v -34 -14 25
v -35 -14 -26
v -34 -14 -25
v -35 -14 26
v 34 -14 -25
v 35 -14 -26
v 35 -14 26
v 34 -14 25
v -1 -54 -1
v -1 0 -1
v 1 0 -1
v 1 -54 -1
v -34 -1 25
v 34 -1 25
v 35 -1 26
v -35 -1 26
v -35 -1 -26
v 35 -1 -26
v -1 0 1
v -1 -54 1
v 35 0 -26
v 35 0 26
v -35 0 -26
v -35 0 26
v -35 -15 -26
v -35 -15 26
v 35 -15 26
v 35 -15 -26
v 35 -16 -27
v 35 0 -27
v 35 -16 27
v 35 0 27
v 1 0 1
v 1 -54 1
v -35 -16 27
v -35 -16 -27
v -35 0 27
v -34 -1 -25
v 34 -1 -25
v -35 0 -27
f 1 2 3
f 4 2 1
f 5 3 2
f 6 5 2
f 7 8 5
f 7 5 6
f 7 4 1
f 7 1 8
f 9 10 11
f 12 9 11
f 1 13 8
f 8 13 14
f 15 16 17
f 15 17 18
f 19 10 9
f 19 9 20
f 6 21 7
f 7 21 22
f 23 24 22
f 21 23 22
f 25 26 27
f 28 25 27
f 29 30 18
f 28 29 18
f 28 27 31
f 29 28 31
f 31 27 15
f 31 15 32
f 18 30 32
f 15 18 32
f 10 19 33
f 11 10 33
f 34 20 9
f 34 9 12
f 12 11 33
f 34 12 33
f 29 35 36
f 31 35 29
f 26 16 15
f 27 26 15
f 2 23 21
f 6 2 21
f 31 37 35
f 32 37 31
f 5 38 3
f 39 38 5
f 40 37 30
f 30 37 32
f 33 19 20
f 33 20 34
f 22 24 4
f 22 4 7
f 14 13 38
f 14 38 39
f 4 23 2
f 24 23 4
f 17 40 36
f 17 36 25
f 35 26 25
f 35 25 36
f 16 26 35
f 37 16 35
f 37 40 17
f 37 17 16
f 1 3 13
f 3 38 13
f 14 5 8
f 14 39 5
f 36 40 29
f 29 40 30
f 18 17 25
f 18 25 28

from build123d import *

# Parameters (mm, degrees)
F0_W     = 70
F0_H     = 54
F1_DEPTH = 16
F2_T     = -1
F3_W     = 70
F3_H     = 52
F4_DEPTH = 14
F5_T     = -1
F6_W     = 2
F6_H     = 2
F7_DEPTH = 54


with BuildPart() as f1:
    # F0 (on Front) → F1 (new body)
    with BuildSketch(Plane.XZ):
        Rectangle(F0_W, F0_H)
    extrude(amount=F1_DEPTH)

    # F2
    f2_openings = [f1.faces().sort_by_distance(p)[0] for p in [
        (35, -8, 0),
        (-35, -8, 0),
    ]]
    offset(amount=F2_T, openings=f2_openings)


with BuildPart() as f4:
    # F3 (on Front) → F4 (new body)
    with BuildSketch(Plane.XZ):
        Rectangle(F3_W, F3_H)
    extrude(amount=F4_DEPTH)

    # F5
    f5_openings = [f4.faces().sort_by_distance(p)[0] for p in [
        (0, -14, 0),
    ]]
    offset(amount=F5_T, openings=f5_openings)


with BuildPart() as f7:
    # F6 (on Front) → F7 (new body)
    with BuildSketch(Plane.XZ):
        Rectangle(F6_W, F6_H)
    extrude(amount=F7_DEPTH)


solid = Compound([f1.part, f4.part, f7.part])
